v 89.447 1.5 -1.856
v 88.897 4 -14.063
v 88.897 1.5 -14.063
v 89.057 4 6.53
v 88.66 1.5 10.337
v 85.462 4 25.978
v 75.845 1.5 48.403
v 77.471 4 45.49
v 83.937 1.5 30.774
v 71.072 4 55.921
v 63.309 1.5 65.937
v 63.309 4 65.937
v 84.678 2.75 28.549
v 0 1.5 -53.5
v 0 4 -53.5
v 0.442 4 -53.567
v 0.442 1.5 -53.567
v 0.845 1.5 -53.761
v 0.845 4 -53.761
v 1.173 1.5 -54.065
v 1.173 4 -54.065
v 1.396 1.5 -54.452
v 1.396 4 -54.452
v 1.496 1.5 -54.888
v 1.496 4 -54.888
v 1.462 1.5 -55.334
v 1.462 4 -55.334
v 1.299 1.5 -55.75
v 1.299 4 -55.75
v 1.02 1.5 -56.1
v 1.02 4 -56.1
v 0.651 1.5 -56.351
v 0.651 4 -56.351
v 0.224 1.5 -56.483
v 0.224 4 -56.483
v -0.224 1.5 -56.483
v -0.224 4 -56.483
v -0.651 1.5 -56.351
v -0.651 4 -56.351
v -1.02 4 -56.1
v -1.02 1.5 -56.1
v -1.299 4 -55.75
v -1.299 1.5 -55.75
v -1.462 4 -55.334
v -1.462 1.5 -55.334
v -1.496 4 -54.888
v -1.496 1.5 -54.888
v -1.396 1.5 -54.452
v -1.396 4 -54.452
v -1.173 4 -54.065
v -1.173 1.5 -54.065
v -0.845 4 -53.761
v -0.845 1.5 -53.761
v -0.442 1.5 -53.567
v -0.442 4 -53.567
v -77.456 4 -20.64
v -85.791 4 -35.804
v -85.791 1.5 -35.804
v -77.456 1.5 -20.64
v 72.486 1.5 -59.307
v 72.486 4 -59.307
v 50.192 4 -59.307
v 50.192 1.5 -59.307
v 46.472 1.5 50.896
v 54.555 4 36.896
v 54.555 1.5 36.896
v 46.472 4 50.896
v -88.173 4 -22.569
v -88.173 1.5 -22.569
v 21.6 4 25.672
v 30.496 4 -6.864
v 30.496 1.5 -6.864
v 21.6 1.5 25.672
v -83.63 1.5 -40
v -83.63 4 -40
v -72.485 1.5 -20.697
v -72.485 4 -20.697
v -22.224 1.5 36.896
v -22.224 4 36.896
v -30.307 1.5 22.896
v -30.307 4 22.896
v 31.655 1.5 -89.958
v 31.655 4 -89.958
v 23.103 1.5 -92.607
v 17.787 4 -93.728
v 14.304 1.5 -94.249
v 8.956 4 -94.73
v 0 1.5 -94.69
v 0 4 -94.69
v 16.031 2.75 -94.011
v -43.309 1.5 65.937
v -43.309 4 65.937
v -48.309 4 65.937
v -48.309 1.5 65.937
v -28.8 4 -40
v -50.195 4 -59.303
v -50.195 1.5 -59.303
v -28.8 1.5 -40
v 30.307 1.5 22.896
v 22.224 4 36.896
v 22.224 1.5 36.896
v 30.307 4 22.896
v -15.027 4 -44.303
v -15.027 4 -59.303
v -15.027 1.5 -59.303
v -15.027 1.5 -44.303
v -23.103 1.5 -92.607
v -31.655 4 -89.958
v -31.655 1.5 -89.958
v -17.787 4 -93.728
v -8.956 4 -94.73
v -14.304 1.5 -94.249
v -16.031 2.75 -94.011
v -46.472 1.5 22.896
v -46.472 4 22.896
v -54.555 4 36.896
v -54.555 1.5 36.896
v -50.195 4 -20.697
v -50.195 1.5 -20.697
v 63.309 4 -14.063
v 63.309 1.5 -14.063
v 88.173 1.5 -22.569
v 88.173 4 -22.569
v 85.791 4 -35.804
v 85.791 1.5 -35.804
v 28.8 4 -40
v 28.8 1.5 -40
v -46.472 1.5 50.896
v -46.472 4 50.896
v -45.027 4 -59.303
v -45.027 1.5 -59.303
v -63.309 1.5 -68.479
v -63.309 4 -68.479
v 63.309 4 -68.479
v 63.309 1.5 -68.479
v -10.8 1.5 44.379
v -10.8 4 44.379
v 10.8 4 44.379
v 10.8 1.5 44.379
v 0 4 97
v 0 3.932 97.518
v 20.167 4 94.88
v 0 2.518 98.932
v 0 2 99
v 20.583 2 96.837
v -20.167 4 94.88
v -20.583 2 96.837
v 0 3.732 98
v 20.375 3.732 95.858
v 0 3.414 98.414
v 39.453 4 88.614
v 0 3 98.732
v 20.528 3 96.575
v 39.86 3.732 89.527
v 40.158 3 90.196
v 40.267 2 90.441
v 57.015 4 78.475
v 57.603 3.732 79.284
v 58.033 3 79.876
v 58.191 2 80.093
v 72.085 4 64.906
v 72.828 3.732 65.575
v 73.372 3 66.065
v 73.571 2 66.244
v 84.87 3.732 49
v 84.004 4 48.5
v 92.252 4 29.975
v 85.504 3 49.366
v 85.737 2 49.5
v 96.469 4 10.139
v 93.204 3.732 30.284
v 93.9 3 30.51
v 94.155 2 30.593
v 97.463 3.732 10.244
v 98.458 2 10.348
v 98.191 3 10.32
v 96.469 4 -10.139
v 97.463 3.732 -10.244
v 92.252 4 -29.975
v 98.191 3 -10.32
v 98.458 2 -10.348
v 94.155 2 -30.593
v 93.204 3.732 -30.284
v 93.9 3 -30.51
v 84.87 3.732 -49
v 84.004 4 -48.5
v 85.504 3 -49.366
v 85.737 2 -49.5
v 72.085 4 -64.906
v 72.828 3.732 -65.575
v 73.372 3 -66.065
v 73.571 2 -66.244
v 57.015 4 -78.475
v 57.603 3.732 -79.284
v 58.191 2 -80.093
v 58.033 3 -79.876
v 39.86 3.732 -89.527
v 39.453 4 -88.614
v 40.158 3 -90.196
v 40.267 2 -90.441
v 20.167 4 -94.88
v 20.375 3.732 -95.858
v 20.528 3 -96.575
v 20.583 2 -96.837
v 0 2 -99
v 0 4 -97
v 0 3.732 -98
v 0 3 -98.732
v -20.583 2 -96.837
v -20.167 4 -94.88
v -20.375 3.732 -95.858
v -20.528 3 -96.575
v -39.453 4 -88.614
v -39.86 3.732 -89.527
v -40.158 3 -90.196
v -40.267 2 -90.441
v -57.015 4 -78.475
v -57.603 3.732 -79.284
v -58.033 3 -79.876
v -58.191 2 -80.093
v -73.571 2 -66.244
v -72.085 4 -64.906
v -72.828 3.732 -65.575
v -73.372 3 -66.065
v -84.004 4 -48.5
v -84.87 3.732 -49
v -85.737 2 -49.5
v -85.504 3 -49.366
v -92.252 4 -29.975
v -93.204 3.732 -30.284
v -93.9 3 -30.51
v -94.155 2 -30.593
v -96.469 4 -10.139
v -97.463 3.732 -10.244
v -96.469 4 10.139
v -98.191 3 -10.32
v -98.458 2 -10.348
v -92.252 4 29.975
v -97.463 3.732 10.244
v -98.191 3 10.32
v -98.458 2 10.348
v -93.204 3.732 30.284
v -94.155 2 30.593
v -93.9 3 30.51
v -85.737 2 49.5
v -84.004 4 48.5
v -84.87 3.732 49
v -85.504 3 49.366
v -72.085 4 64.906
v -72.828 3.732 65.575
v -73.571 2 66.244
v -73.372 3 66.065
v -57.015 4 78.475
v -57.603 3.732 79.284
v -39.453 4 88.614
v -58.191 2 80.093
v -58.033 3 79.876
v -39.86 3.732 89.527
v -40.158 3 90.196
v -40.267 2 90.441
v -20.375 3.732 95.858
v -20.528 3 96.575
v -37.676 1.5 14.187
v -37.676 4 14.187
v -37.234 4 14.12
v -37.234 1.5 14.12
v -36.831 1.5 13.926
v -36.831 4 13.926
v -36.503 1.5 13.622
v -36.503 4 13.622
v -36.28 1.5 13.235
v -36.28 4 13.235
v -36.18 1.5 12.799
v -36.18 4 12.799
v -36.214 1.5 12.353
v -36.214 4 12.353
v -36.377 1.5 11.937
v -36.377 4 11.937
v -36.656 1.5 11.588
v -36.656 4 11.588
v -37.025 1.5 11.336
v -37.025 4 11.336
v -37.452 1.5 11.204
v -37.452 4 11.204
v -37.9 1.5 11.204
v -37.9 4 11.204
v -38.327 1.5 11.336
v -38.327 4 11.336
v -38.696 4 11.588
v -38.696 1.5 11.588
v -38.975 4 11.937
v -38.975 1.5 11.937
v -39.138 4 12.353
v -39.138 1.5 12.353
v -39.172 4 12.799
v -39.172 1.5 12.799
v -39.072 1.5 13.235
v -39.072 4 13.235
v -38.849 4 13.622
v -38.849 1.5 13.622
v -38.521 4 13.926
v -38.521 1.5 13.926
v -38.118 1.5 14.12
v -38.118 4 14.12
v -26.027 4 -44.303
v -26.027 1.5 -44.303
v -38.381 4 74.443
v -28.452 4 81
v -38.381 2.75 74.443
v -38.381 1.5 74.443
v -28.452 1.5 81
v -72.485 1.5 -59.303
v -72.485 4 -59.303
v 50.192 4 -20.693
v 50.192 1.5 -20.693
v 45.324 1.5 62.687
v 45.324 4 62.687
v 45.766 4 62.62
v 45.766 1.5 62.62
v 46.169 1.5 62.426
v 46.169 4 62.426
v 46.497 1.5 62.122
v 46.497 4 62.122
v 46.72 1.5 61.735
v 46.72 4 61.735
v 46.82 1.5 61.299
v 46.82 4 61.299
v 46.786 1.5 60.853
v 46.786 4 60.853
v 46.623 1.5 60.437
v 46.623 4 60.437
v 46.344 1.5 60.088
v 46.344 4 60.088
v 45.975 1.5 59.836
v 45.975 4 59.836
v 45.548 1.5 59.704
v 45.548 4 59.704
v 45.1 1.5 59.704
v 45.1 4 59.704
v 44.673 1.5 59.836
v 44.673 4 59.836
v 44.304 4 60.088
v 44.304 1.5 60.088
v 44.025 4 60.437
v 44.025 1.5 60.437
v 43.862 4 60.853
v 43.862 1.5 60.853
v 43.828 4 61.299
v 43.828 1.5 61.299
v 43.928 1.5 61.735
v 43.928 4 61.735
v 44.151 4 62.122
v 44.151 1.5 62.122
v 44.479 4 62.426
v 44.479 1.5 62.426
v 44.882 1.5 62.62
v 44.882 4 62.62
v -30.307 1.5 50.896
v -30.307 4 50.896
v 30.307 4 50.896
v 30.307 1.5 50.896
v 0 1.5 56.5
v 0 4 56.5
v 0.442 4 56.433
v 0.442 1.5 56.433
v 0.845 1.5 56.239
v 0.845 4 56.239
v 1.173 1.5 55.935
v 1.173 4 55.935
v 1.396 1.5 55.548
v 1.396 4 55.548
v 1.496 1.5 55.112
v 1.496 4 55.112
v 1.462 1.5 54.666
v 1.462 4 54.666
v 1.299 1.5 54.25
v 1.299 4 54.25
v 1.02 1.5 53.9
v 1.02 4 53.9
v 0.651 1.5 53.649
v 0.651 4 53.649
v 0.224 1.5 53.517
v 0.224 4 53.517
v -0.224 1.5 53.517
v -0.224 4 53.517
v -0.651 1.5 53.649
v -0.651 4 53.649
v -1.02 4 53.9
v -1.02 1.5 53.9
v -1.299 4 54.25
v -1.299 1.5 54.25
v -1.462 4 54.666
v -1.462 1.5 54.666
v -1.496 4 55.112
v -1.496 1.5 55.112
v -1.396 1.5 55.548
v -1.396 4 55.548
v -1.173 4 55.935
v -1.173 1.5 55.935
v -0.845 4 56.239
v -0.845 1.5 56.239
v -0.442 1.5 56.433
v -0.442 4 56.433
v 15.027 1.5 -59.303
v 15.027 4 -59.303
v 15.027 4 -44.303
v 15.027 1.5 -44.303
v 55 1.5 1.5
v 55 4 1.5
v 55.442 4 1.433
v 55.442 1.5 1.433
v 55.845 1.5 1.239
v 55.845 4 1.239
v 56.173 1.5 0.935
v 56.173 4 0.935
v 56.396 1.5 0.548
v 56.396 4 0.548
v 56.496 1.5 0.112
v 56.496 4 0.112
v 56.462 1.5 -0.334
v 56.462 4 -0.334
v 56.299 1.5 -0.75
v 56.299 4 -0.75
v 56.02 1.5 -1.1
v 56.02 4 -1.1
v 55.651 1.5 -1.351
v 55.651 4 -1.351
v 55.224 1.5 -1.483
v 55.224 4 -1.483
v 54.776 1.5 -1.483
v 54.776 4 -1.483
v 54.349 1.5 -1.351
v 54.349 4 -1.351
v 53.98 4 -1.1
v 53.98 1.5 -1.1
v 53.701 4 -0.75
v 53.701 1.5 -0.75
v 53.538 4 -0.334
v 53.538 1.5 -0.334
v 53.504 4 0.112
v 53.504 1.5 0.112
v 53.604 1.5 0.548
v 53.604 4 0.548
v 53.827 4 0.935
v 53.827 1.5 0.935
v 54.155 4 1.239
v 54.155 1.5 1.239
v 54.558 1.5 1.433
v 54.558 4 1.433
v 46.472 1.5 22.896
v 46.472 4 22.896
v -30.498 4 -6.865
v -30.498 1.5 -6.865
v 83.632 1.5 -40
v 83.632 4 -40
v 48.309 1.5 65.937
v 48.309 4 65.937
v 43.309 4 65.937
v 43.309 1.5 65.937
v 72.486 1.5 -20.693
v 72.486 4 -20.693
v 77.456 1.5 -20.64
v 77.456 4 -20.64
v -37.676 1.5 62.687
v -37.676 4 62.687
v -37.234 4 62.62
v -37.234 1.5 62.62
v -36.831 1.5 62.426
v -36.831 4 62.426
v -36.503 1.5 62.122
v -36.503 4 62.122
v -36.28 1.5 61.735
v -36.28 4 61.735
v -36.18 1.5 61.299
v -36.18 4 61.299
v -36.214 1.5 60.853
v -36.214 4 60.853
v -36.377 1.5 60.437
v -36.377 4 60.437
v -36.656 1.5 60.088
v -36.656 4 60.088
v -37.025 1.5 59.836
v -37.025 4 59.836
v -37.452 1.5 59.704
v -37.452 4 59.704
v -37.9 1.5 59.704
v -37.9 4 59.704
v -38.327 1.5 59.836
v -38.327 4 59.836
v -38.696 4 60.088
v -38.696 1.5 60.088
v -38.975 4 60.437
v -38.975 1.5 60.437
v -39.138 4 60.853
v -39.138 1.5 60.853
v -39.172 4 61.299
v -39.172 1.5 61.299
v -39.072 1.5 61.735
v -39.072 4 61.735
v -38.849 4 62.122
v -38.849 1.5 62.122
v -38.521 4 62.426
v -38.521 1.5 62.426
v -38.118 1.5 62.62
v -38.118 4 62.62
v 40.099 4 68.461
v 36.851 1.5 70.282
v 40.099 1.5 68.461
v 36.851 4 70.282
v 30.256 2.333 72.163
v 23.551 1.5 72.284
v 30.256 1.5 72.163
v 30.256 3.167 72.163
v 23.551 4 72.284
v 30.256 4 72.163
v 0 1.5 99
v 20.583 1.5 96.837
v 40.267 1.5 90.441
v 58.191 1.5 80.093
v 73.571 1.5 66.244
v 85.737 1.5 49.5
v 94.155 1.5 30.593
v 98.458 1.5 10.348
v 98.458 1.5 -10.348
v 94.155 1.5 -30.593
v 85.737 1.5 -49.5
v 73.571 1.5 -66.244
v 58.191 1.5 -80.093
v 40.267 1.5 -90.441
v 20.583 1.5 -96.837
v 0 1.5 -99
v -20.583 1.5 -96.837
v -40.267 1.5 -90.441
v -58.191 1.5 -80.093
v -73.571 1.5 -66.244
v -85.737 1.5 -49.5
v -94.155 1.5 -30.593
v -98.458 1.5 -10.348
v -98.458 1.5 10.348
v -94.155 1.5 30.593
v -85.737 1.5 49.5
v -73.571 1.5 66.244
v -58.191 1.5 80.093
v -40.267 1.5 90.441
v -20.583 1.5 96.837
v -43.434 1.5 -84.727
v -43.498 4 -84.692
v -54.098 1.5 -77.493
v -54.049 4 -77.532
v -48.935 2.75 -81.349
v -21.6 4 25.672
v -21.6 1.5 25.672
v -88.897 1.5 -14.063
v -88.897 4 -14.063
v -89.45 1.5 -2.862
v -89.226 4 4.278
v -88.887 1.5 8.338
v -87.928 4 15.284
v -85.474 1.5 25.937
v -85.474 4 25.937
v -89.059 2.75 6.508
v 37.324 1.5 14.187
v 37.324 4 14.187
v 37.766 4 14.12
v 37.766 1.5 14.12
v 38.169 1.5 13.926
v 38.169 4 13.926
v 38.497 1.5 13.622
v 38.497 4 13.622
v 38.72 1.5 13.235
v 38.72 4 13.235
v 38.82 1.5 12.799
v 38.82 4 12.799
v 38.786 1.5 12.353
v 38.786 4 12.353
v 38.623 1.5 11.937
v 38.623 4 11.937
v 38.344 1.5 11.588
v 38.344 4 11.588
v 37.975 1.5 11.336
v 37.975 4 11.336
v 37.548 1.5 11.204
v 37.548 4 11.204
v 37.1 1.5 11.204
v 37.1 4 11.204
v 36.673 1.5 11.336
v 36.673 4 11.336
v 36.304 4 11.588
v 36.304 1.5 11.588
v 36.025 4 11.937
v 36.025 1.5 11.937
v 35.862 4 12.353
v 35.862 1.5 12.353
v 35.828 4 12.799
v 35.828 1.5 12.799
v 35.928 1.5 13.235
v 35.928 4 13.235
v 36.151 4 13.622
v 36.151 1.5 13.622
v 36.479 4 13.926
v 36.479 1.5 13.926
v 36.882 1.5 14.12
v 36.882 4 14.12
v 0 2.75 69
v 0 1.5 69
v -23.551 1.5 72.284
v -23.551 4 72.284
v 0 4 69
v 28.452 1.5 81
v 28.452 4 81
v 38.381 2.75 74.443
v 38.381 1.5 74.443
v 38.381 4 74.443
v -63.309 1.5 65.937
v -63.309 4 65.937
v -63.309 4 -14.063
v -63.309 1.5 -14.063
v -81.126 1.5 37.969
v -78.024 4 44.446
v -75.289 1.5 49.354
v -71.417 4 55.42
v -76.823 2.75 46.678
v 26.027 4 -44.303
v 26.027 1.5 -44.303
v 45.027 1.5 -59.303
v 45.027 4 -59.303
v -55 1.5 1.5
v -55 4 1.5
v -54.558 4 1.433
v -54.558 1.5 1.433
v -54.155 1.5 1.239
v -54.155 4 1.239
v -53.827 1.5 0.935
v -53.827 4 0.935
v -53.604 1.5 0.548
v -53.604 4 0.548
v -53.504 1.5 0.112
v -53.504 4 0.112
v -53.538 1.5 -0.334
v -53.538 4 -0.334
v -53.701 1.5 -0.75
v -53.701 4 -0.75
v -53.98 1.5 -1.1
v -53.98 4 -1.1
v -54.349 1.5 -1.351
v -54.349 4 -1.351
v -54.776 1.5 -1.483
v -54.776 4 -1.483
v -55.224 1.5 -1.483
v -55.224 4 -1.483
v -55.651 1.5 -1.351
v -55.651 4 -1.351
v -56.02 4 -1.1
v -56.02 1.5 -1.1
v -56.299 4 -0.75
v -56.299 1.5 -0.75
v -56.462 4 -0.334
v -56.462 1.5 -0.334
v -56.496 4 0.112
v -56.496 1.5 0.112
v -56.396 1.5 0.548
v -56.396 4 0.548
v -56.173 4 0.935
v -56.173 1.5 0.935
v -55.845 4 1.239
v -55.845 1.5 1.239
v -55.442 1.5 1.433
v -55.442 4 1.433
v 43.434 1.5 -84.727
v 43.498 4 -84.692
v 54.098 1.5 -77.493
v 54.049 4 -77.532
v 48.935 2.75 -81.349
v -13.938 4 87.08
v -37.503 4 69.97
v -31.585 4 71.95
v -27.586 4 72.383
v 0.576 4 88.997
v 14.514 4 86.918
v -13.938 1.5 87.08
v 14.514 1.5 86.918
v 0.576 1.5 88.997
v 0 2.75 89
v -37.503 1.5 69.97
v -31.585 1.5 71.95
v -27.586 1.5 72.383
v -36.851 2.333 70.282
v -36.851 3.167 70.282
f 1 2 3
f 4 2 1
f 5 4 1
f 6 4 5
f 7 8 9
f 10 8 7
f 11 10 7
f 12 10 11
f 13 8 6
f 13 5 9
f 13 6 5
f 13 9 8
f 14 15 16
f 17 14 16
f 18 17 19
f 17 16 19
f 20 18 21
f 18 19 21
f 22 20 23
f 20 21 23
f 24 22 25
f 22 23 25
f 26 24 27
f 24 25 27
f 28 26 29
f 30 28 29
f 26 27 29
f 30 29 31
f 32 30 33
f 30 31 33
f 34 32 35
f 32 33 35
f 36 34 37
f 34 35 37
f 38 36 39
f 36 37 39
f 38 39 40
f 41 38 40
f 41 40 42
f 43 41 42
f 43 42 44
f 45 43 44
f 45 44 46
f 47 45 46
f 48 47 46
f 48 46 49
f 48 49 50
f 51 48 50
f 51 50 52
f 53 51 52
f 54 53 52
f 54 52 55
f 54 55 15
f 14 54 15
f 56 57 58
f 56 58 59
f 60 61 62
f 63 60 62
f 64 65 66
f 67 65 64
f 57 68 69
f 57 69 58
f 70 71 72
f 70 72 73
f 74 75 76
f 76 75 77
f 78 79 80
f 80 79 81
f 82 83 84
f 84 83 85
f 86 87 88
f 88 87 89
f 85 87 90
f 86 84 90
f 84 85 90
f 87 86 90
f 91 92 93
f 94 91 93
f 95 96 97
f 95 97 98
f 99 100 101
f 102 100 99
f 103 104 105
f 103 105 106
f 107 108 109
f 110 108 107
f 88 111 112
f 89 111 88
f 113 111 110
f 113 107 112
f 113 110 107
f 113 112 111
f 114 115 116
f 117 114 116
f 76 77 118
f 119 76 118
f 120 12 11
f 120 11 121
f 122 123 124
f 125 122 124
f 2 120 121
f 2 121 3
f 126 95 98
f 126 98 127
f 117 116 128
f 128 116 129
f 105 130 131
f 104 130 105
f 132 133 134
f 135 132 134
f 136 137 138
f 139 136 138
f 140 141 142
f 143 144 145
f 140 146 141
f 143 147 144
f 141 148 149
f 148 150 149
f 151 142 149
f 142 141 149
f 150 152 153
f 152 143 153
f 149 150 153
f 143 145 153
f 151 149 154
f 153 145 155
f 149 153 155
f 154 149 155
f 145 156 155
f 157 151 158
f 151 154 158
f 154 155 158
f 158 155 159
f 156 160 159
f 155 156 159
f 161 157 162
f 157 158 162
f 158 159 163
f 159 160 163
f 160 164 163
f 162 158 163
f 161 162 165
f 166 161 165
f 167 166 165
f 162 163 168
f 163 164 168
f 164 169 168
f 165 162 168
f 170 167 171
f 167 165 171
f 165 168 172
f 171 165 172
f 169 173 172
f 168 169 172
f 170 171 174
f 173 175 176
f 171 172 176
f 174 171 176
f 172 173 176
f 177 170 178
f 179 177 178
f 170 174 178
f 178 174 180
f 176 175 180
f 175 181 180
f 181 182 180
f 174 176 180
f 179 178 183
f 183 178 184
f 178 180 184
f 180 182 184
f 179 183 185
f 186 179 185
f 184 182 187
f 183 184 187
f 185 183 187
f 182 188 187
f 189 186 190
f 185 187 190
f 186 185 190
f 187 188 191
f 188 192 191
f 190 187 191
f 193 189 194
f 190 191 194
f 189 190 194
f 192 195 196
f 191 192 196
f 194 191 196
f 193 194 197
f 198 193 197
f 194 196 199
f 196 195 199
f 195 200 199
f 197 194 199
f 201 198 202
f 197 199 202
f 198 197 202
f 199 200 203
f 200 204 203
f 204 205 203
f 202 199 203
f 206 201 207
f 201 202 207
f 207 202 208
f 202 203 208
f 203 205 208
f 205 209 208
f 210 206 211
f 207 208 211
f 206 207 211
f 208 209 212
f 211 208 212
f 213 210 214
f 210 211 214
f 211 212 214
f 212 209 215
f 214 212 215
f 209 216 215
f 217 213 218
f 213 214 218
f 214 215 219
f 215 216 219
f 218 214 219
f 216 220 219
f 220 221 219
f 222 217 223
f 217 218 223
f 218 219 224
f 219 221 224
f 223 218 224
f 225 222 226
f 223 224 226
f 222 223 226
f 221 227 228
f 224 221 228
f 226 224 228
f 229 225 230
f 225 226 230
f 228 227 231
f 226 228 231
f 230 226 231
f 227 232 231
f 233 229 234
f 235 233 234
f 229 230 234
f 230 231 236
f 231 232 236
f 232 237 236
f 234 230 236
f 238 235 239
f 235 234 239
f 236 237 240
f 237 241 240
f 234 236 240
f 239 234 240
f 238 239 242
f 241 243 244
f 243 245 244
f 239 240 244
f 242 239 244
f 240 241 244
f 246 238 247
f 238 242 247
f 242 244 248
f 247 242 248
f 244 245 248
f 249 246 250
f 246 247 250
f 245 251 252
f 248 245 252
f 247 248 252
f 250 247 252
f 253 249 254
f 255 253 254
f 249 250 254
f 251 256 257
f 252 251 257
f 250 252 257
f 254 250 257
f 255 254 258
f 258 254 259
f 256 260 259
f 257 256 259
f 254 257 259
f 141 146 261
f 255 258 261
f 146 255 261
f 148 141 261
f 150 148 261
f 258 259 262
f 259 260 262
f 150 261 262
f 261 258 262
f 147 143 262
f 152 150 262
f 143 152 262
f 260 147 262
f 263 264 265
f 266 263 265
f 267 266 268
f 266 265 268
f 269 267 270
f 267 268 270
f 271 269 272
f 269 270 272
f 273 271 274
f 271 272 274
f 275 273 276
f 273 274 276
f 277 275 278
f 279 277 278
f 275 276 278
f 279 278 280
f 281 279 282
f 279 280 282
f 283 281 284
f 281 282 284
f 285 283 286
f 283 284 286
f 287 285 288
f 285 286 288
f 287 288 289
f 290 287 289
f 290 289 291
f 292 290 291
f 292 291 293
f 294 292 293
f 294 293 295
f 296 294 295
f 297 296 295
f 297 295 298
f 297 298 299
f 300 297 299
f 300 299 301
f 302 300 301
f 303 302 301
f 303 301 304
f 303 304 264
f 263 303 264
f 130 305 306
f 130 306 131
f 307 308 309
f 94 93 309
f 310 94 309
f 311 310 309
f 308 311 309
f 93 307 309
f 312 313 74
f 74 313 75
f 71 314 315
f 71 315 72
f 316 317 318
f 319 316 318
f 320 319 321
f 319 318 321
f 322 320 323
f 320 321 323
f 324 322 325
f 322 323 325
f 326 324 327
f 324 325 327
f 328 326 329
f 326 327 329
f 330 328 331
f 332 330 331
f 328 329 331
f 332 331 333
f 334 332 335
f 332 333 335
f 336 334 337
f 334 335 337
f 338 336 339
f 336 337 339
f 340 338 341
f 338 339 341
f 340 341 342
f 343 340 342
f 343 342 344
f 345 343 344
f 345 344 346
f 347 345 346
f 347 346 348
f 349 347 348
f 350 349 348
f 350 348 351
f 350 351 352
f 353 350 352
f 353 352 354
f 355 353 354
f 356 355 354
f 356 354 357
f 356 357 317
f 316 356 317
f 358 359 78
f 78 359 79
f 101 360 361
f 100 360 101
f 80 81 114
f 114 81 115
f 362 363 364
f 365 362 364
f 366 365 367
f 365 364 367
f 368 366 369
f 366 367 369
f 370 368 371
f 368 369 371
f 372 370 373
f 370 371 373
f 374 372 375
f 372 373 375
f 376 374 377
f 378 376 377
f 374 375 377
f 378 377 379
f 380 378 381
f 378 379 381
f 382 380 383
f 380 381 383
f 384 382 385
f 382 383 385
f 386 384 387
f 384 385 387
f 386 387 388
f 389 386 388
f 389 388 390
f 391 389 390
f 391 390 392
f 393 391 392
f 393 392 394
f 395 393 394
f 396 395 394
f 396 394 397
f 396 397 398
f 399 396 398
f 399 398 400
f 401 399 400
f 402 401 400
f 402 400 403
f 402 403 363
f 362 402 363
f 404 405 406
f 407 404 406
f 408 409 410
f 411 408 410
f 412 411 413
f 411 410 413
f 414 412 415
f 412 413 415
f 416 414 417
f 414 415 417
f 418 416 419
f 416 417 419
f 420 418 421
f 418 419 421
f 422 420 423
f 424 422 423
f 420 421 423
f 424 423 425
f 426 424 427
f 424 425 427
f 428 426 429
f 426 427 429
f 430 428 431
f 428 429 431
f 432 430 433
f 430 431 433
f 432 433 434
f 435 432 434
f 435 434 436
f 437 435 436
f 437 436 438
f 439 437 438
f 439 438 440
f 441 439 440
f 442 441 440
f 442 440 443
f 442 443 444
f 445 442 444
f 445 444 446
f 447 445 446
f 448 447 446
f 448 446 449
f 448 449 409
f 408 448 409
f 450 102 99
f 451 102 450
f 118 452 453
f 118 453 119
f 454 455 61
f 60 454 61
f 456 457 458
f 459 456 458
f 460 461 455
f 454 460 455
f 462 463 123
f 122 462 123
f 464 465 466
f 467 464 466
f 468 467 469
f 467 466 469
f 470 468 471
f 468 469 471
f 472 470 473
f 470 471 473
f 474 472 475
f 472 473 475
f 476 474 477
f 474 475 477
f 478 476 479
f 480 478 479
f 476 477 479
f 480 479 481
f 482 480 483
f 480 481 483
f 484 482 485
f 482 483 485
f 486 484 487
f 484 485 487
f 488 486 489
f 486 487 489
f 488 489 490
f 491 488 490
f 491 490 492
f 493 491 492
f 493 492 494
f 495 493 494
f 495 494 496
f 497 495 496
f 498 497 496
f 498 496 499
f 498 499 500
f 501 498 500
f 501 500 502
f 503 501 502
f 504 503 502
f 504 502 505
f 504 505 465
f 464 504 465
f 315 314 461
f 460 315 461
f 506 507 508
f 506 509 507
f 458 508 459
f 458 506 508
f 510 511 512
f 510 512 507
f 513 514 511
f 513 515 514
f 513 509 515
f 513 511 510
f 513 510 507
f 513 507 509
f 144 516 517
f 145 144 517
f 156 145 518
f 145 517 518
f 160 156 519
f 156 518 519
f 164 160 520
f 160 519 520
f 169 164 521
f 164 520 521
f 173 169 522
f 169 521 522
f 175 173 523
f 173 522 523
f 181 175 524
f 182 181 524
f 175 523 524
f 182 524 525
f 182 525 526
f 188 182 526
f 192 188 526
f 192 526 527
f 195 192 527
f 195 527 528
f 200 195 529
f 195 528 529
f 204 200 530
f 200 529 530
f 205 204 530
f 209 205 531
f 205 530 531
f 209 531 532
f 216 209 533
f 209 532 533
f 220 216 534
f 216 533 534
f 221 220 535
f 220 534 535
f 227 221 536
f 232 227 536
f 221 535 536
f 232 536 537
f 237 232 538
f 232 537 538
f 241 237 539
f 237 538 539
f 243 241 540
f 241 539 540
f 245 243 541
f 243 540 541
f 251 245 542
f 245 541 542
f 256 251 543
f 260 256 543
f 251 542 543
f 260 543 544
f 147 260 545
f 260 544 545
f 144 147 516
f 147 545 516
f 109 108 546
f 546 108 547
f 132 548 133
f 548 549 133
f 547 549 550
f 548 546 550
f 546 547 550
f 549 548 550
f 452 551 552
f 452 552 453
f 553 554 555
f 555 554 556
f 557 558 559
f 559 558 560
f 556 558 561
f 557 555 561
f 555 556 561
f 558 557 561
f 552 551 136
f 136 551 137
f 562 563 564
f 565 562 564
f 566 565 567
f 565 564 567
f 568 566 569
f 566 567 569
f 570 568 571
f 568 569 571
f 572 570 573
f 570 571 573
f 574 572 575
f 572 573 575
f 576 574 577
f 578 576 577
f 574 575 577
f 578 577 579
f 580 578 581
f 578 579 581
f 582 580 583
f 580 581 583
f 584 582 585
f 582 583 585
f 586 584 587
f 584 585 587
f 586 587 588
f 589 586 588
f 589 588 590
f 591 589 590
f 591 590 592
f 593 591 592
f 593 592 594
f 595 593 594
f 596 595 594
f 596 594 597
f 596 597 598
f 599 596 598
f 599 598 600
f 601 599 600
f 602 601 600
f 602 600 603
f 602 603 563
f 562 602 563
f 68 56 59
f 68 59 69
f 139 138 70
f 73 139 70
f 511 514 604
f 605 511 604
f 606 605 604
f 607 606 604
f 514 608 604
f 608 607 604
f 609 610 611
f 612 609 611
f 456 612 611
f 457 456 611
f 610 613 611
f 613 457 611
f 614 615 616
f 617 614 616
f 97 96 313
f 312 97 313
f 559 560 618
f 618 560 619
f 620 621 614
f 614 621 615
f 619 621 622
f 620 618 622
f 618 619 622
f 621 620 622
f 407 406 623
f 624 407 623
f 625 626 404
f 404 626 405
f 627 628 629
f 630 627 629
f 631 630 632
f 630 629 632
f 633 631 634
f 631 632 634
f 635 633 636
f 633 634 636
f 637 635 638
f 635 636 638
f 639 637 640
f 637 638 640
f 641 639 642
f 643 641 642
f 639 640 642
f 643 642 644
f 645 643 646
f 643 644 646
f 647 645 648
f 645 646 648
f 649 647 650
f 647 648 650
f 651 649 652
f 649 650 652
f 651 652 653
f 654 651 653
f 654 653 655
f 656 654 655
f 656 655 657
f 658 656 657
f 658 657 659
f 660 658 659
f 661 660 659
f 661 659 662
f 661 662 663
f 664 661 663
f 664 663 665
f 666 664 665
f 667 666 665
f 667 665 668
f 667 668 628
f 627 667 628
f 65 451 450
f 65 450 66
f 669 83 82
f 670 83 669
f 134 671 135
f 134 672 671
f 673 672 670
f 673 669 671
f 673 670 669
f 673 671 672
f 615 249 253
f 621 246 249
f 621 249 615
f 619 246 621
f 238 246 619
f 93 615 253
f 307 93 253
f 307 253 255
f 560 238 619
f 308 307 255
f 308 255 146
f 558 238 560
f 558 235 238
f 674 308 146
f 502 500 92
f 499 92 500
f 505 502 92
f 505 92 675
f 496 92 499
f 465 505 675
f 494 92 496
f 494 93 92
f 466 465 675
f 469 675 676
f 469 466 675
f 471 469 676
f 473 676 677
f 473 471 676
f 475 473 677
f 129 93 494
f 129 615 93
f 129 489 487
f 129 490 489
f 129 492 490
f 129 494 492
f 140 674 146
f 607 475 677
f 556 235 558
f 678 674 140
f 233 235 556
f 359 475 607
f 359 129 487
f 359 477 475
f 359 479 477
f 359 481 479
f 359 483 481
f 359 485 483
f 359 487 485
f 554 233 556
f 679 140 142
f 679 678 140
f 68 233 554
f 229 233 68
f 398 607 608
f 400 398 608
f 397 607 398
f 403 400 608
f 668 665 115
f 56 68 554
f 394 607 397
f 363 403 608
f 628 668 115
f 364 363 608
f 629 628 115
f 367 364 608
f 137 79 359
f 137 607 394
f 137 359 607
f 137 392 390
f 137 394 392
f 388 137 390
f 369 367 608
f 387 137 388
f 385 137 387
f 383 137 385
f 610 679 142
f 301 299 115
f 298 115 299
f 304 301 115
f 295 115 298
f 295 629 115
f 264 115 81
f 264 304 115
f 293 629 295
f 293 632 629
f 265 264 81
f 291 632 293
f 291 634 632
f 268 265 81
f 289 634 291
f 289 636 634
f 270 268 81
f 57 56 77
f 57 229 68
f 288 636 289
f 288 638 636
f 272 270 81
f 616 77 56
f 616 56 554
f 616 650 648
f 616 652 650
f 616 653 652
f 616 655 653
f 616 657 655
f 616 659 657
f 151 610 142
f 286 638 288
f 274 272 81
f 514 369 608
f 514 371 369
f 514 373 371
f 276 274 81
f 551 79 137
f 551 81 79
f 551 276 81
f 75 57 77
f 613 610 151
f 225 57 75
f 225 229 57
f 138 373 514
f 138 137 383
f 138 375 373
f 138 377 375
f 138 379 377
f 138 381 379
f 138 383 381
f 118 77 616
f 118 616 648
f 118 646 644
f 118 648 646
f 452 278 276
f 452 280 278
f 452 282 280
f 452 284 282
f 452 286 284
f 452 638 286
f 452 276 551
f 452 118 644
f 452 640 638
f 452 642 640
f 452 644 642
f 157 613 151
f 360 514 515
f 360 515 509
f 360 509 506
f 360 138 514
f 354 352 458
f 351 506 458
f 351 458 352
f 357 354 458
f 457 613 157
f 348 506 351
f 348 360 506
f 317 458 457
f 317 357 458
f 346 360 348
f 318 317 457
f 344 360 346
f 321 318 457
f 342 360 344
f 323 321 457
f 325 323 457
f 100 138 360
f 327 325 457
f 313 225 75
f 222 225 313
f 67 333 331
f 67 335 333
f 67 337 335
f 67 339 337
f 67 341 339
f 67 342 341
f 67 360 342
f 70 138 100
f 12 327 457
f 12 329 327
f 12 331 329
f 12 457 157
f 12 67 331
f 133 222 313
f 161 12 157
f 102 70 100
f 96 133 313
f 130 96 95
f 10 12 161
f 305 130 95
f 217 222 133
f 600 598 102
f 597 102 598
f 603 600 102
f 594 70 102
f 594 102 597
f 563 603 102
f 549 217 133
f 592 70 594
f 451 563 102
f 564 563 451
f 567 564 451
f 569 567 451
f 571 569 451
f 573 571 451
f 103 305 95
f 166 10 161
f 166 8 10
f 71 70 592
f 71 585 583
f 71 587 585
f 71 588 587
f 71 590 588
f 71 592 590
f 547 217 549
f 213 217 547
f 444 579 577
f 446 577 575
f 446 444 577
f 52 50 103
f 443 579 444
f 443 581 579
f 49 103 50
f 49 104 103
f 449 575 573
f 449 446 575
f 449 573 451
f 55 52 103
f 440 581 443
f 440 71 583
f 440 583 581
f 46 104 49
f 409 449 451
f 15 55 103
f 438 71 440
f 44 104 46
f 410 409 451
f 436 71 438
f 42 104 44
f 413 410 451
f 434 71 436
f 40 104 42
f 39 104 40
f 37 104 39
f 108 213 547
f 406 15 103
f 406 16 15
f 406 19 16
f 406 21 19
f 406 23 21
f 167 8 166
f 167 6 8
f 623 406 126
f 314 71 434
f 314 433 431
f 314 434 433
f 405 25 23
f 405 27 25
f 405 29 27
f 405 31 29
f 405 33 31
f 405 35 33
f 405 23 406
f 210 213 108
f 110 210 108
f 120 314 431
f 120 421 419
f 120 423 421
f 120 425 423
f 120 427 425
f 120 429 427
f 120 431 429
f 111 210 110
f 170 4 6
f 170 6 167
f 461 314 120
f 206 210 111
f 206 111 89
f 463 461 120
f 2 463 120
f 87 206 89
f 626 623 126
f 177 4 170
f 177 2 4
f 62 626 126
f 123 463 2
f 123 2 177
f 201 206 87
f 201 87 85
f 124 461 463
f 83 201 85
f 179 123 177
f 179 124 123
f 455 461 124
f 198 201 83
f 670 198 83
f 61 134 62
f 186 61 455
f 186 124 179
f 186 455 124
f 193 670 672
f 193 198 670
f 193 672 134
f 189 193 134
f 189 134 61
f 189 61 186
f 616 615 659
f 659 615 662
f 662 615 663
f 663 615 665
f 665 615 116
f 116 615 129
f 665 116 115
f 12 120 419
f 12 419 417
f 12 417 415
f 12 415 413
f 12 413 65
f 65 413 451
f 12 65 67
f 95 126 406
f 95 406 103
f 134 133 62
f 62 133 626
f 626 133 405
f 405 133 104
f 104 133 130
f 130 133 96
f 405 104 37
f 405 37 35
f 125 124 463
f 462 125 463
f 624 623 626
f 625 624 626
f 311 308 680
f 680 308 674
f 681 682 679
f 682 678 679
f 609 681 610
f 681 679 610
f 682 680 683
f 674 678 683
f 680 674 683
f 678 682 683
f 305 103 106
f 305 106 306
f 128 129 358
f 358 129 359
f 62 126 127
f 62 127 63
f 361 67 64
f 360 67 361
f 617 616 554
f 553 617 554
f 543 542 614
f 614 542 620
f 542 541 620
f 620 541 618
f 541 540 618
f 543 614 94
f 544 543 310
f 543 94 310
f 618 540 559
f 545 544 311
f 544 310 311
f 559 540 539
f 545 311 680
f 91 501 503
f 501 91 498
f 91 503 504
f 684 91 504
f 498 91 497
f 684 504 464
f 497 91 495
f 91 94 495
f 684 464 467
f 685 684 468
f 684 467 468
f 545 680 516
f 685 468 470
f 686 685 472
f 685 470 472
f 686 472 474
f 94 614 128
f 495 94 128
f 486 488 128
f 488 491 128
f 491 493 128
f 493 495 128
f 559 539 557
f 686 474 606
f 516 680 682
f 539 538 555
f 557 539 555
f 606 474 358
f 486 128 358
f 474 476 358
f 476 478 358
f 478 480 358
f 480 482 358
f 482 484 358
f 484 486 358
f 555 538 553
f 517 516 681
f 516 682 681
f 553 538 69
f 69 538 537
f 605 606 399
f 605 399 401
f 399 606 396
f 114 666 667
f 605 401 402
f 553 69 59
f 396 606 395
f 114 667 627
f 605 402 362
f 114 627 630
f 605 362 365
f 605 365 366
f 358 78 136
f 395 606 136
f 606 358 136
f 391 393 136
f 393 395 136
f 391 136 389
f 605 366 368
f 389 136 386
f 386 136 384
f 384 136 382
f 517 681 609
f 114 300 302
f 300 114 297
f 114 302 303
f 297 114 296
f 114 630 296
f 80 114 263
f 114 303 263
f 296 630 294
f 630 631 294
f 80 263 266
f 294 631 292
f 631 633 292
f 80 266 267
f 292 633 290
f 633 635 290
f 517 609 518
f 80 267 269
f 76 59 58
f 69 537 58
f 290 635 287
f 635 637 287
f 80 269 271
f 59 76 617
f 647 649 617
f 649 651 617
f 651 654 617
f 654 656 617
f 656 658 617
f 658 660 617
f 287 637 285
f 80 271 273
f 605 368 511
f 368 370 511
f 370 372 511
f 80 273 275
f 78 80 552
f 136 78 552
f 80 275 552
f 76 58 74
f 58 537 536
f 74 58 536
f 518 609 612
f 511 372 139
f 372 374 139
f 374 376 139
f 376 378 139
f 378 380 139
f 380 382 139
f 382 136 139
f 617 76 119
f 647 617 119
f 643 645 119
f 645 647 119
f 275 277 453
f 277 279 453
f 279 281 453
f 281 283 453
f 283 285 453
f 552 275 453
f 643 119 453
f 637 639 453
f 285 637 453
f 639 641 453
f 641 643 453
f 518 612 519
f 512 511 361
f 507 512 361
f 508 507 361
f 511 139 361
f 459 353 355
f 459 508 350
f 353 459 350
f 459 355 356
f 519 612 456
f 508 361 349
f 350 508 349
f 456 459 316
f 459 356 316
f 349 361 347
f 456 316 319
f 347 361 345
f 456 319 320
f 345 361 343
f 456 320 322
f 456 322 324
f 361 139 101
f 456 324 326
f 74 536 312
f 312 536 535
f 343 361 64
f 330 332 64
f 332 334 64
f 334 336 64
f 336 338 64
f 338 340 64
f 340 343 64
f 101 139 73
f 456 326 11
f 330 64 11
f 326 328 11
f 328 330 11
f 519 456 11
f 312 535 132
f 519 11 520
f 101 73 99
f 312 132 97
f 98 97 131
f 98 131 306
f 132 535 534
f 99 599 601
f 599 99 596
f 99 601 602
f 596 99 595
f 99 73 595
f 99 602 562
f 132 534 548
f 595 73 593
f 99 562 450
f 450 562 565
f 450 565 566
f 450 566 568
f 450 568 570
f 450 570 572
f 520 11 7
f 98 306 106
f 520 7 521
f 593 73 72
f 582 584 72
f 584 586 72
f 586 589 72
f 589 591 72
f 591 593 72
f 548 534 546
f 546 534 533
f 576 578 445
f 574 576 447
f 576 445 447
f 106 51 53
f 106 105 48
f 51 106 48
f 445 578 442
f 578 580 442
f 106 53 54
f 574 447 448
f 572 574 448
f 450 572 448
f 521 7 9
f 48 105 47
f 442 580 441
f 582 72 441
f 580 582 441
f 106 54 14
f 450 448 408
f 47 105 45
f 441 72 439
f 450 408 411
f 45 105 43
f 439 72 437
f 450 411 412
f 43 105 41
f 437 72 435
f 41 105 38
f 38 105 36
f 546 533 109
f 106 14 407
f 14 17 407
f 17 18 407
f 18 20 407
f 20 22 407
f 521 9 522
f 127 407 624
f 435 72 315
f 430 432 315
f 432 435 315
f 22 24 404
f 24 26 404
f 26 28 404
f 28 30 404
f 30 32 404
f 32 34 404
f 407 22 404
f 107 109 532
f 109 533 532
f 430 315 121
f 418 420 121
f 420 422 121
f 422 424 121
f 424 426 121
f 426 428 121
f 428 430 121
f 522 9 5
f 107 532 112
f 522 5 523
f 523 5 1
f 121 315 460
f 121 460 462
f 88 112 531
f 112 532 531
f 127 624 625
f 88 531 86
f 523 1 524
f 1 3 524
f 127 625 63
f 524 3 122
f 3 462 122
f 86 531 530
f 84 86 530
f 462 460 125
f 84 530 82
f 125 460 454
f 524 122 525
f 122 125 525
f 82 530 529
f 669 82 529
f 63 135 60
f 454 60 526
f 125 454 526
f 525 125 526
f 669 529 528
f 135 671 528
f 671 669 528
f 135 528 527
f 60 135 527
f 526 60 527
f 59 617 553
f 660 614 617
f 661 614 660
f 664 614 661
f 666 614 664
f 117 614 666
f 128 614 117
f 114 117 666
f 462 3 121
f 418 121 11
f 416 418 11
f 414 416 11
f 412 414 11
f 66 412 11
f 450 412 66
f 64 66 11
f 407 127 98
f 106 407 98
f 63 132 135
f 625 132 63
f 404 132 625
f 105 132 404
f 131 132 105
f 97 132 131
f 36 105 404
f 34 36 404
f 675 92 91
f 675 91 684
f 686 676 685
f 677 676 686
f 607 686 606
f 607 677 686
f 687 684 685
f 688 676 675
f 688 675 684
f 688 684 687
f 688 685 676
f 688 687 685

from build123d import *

# Parameters (mm, degrees)
BOSS_EXTRUDE1_DEPTH      = 4
BOSS_EXTRUDE1_DEPTH_BACK = 2.5
SKETCH1_R                = 99
SKETCH3_R                = 1.5
CUT_EXTRUDE2_DEPTH       = 20.5
SKETCH4_R                = 1.5
CUT_EXTRUDE3_DEPTH       = 20.5
CUT_EXTRUDE4_DEPTH       = 10
CUT_EXTRUDE5_DEPTH       = 10
CUT_EXTRUDE6_DEPTH       = 10
BOSS_EXTRUDE4_DEPTH      = 6.5
CUT_EXTRUDE12_DEPTH      = 147.5
CUT_EXTRUDE12_DEPTH_BACK = 90
SKETCH9_W                = 198
SKETCH9_H                = 4
SKETCH15_R               = 1.5
CUT_EXTRUDE13_DEPTH      = 147.5
BOSS_EXTRUDE12_DEPTH     = 2.5
CUT_EXTRUDE14_DEPTH      = 2.5
CUT_EXTRUDE15_DEPTH      = 2.5
BOSS_EXTRUDE14_DEPTH     = 2.5
CUT_EXTRUDE28_DEPTH      = 2.5
CUT_EXTRUDE30_DEPTH      = 2.5
CUT_EXTRUDE31_DEPTH      = 2.5
CUT_EXTRUDE32_DEPTH      = 2.5
CUT_EXTRUDE33_DEPTH      = 2.5
FILLET1_R                = 2


with BuildPart() as part:
    # Sketch1 → Boss-Extrude1 (new, two sides: drawn at the far end of the back side and taken through both)
    with BuildSketch(Plane(origin=(0, 0, 0), x_dir=(1, 0, 0), z_dir=(0, 1, 0)).offset(-BOSS_EXTRUDE1_DEPTH_BACK)):
        with Locations(Location((0, 0, 0), (0, 0, 270))):
            Circle(SKETCH1_R)
    extrude(amount=BOSS_EXTRUDE1_DEPTH + BOSS_EXTRUDE1_DEPTH_BACK)

    # Sketch3 → Cut-Extrude2 (cut)
    with BuildSketch(Plane(origin=(0, 4, 0), x_dir=(1, 0, 0), z_dir=(0, 1, 0))):
        with Locations(Location((-55, 0, 0), (0, 0, 270))):
            Circle(SKETCH3_R)
        with Locations(Location((55, 0, 0), (0, 0, 270))):
            Circle(SKETCH3_R)
        with Locations(Location((0, -55, 0), (0, 0, 270))):
            Circle(SKETCH3_R)
    extrude(amount=-CUT_EXTRUDE2_DEPTH, mode=Mode.SUBTRACT)

    # Sketch4 → Cut-Extrude3 (cut)
    with BuildSketch(Plane(origin=(0, 4, 0), x_dir=(1, 0, 0), z_dir=(0, 1, 0))):
        with Locations(Location((-37.67598398, -12.687109852, 0), (0, 0, 270))):
            Circle(SKETCH4_R)
        with Locations(Location((-37.67598398, -61.187109852, 0), (0, 0, 270))):
            Circle(SKETCH4_R)
        with Locations(Location((45.32401602, -61.187109852, 0), (0, 0, 270))):
            Circle(SKETCH4_R)
        with Locations(Location((37.32401602, -12.687109852, 0), (0, 0, 270))):
            Circle(SKETCH4_R)
    extrude(amount=-CUT_EXTRUDE3_DEPTH, mode=Mode.SUBTRACT)

    # Sketch5 → Cut-Extrude4 (cut)
    with BuildSketch(Plane(origin=(0, 4, 0), x_dir=(1, 0, 0), z_dir=(0, 1, 0))):
        Polygon((28.800278696, 40), (14.400139348, 64.941772986), (-14.400139348, 64.941772986), (-28.800278696, 40), (-14.400139348, 15.058227014), (14.400139348, 15.058227014), align=None)
        Polygon((21.600209022, -25.67229275), (10.800104511, -6.965963011), (-10.800104511, -6.965963011), (-21.600209022, -25.67229275), (-10.800104511, -44.37862249), (10.800104511, -44.37862249), align=None)
        Polygon((83.632371409, 40), (72.485714402, 59.306576271), (50.192400388, 59.306576271), (39.045743381, 40), (50.192400388, 20.693423729), (72.485714402, 20.693423729), align=None)
        Polygon((-39.050278696, 40), (-50.195139348, 59.303464893), (-72.484860652, 59.303464893), (-83.629721304, 40), (-72.484860652, 20.696535107), (-50.195139348, 20.696535107), align=None)
    extrude(amount=-CUT_EXTRUDE4_DEPTH, mode=Mode.SUBTRACT)

    # Sketch6 → Cut-Extrude5 (cut)
    with BuildSketch(Plane(origin=(0, 4, 0), x_dir=(1, 0, 0), z_dir=(0, 1, 0))):
        with BuildLine():
            add(Edge.make_bspline(
                [(-31.654711151, 89.957779093), (-50.388052391, 83.478791384), (-63.309422303, 68.478903242)],
                knots=[0, 0, 0, 1, 1, 1], degree=2))
            Line((-63.309422303, 68.478903242), (0, 68.478903242))
            Line((0, 68.478903242), (0, 89.957779093))
            Line((0, 89.957779093), (-31.654711151, 89.957779093))
        make_face()
        with BuildLine():
            Line((0, 89.957779093), (0, 68.478903242))
            Line((0, 68.478903242), (63.309422303, 68.478903242))
            add(Edge.make_bspline(
                [(31.654711151, 89.957779093), (50.388052391, 83.478791384), (63.309422303, 68.478903242)],
                knots=[0, 0, 0, 1, 1, 1], degree=2))
            Line((31.654711151, 89.957779093), (0, 89.957779093))
        make_face()
        with BuildLine():
            add(Edge.make_bspline(
                [(-31.654711151, 89.957779093), (-16.234373416, 95.698858628), (0, 94.690381395)],
                knots=[0, 0, 0, 1, 1, 1], degree=2))
            Line((-31.654711151, 89.957779093), (0, 89.957779093))
            Line((0, 89.957779093), (0, 94.690381395))
        make_face()
        with BuildLine():
            Line((0, 94.690381395), (0, 89.957779093))
            Line((0, 89.957779093), (31.654711151, 89.957779093))
            add(Edge.make_bspline(
                [(31.654711151, 89.957779093), (16.234373416, 95.698858628), (0, 94.690381395)],
                knots=[0, 0, 0, 1, 1, 1], degree=2))
        make_face()
    extrude(amount=-CUT_EXTRUDE5_DEPTH, mode=Mode.SUBTRACT)

    # Sketch7 → Cut-Extrude6 (cut)
    with BuildSketch(Plane(origin=(0, 4, 0), x_dir=(1, 0, 0), z_dir=(0, 1, 0))):
        with BuildLine():
            Line((-75.473576138, -25.936867131), (-63.309422303, -25.936867131))
            Line((-63.309422303, -25.936867131), (-63.309422303, 14.063132869))
            Line((-63.309422303, 14.063132869), (-88.897300533, 14.063132869))
            add(Edge.make_bspline(
                [(-88.897300533, 14.063132869), (-90.933307094, -7.078529926), (-85.473576138, -25.936867131)],
                knots=[0, 0, 0, 0.467488594, 0.467488594, 0.467488594], degree=2))
            Line((-85.473576138, -25.936867131), (-75.473576138, -25.936867131))
        make_face()
        with BuildLine():
            add(Edge.make_bspline(
                [(-85.473576138, -25.936867131), (-79.254453264, -47.418203342), (-63.309422303, -65.936867131)],
                knots=[0.467488594, 0.467488594, 0.467488594, 1, 1, 1], degree=2))
            Line((-63.309422303, -65.936867131), (-63.309422303, -25.936867131))
            Line((-63.309422303, -25.936867131), (-75.473576138, -25.936867131))
            Line((-75.473576138, -25.936867131), (-85.473576138, -25.936867131))
        make_face()
        with BuildLine():
            add(Edge.make_bspline(
                [(88.897300533, 14.063132869), (93.252501041, -31.160778622), (63.309422303, -65.936867131)],
                knots=[0, 0, 0, 1, 1, 1], degree=2))
            Line((63.309422303, -65.936867131), (63.309422303, 14.063132869))
            Line((63.309422303, 14.063132869), (88.897300533, 14.063132869))
        make_face()
    extrude(amount=-CUT_EXTRUDE6_DEPTH, mode=Mode.SUBTRACT)

    # Sketch8 → Boss-Extrude4 (add)
    with BuildSketch(Plane(origin=(0, 4, 0), x_dir=(1, 0, 0), z_dir=(0, 1, 0))):
        Polygon((14.400139348, 64.941772986), (-14.400139348, 64.941772986), (-28.800278696, 40), (0, 40), (28.800278696, 40), align=None)
    extrude(amount=-BOSS_EXTRUDE4_DEPTH)

    # Sketch9 → Cut-Extrude12 (cut, two sides: drawn at the far end of the back side and taken through both)
    with BuildSketch(Plane.XY.offset(-14.063132869).offset(-CUT_EXTRUDE12_DEPTH_BACK)):
        with Locations((0, -0.5)):
            Rectangle(SKETCH9_W, SKETCH9_H)
    extrude(amount=CUT_EXTRUDE12_DEPTH + CUT_EXTRUDE12_DEPTH_BACK, mode=Mode.SUBTRACT)

    # Sketch15 → Cut-Extrude13 (cut)
    with BuildSketch(Plane(origin=(0, 4, 0), x_dir=(1, 0, 0), z_dir=(0, 1, 0))):
        with Locations(Location((0, 55, 0), (0, 0, 270))):
            Circle(SKETCH15_R)
    extrude(amount=-CUT_EXTRUDE13_DEPTH, mode=Mode.SUBTRACT)

    # Sketch16 → Boss-Extrude12 (add)
    with BuildSketch(Plane(origin=(0, 4, 0), x_dir=(1, 0, 0), z_dir=(0, 1, 0))):
        Polygon((-43.18, 47.15288712), (-43.18, 32.84711288), (-39.050278696, 40), align=None)
        Polygon((43.18, 47.160742516), (43.18, 32.839257484), (50.192400388, 20.693423729), (50.192400388, 59.306576271), align=None)
        Polygon((39.045743381, 40), (43.18, 32.839257484), (43.18, 47.160742516), align=None)
        Polygon((-50.195139348, 59.303464893), (-50.195139348, 20.696535107), (-39.050278696, 40), align=None)
    extrude(amount=-BOSS_EXTRUDE12_DEPTH)

    # Sketch17 → Cut-Extrude14 (cut)
    with BuildSketch(Plane(origin=(0, 4, 0), x_dir=(1, 0, 0), z_dir=(0, 1, 0))):
        Polygon((-46.472442717, -50.896241942), (-30.30663518, -50.896241942), (-22.223731411, -36.896241942), (-30.30663518, -22.896241942), (-46.472442717, -22.896241942), (-54.555346486, -36.896241942), align=None)
        Polygon((22.223731411, -36.896241942), (30.30663518, -22.896241942), (46.472442717, -22.896241942), (54.555346486, -36.896241942), (46.472442717, -50.896241942), (30.30663518, -50.896241942), align=None)
    extrude(amount=-CUT_EXTRUDE14_DEPTH, mode=Mode.SUBTRACT)

    # Sketch18 → Cut-Extrude15 (cut)
    with BuildSketch(Plane(origin=(0, 4, 0), x_dir=(1, 0, 0), z_dir=(0, 1, 0))):
        with BuildLine():
            Line((-23.550738761, -72.283664778), (-28.452320168, -81))
            add(Edge.make_bspline(
                [(-28.452320168, -81), (-14.226160084, -89), (0, -89)],
                knots=[0.205519971, 0.205519971, 0.205519971, 0.5, 0.5, 0.5], degree=2))
            Line((0, -89), (0, -69))
            add(Edge.make_bspline(
                [(-23.550738761, -72.283664778), (-15.813437997, -71.682250906), (-7.906718999, -69), (0, -69)],
                knots=[0.233014595, 0.233014595, 0.233014595, 0.233014595, 0.5, 0.5, 0.5, 0.5], degree=3))
        make_face()
        with BuildLine():
            Line((-43.309422303, -65.936867131), (-48.309422303, -65.936867131))
            add(Edge.make_bspline(
                [(-48.309422303, -65.936867131), (-38.380871236, -75.416735924), (-28.452320168, -81)],
                knots=[0, 0, 0, 0.205519971, 0.205519971, 0.205519971], degree=2))
            Line((-28.452320168, -81), (-23.550738761, -72.283664778))
            add(Edge.make_bspline(
                [(-43.309422303, -65.936867131), (-36.927327916, -71.748446546), (-30.30355735, -72.80855568), (-23.550738761, -72.283664778)],
                knots=[0, 0, 0, 0, 0.233014595, 0.233014595, 0.233014595, 0.233014595], degree=3))
        make_face()
        with BuildLine():
            Line((0, -69), (0, -89))
            add(Edge.make_bspline(
                [(0, -89), (14.226160084, -89), (28.452320168, -81)],
                knots=[0.5, 0.5, 0.5, 0.794480029, 0.794480029, 0.794480029], degree=2))
            Line((28.452320168, -81), (23.550738761, -72.283664778))
            add(Edge.make_bspline(
                [(0, -69), (7.906718999, -69), (15.813437997, -71.682250906), (23.550738761, -72.283664778)],
                knots=[0.5, 0.5, 0.5, 0.5, 0.766985405, 0.766985405, 0.766985405, 0.766985405], degree=3))
        make_face()
        with BuildLine():
            Line((23.550738761, -72.283664778), (28.452320168, -81))
            add(Edge.make_bspline(
                [(28.452320168, -81), (38.380871236, -75.416735924), (48.309422303, -65.936867131)],
                knots=[0.794480029, 0.794480029, 0.794480029, 1, 1, 1], degree=2))
            Line((48.309422303, -65.936867131), (43.309422303, -65.936867131))
            add(Edge.make_bspline(
                [(23.550738761, -72.283664778), (30.30355735, -72.80855568), (36.927327916, -71.748446546), (43.309422303, -65.936867131)],
                knots=[0.766985405, 0.766985405, 0.766985405, 0.766985405, 1, 1, 1, 1], degree=3))
        make_face()
    extrude(amount=-CUT_EXTRUDE15_DEPTH, mode=Mode.SUBTRACT)

    # Sketch19 → Boss-Extrude14 (add)
    with BuildSketch(Plane(origin=(0, 4, 0), x_dir=(1, 0, 0), z_dir=(0, 1, 0))):
        Polygon((-10.800104511, -6.965963011), (-30.30663518, -22.896241942), (-14.400139348, 15.058227014), (14.400139348, 15.058227014), (30.30663518, -22.896241942), (10.800104511, -6.965963011), align=None)
    extrude(amount=-BOSS_EXTRUDE14_DEPTH)

    # Sketch20 → Cut-Extrude28 (cut)
    with BuildSketch(Plane(origin=(0, 4, 0), x_dir=(1, 0, 0), z_dir=(0, 1, 0))):
        Polygon((-28.800278696, 40), (-10.800104511, -6.965963011), (10.800104511, -6.965963011), (28.800278696, 40), (14.400139348, 15.058227014), (-14.400139348, 15.058227014), align=None)
    extrude(amount=-CUT_EXTRUDE28_DEPTH, mode=Mode.SUBTRACT)

    # Sketch24 → Cut-Extrude30 (cut)
    with BuildSketch(Plane(origin=(0, 4, 0), x_dir=(1, 0, 0), z_dir=(0, 1, 0))):
        Polygon((-50.195139348, 20.696535107), (-50.195139348, 59.303464893), (-28.800278696, 40), (-10.800104511, -6.965963011), align=None)
        Polygon((10.800104511, -6.965963011), (28.800278696, 40), (50.192400388, 59.306576271), (50.192400388, 20.693423729), align=None)
    extrude(amount=-CUT_EXTRUDE30_DEPTH, mode=Mode.SUBTRACT)

    # Sketch25 → Cut-Extrude31 (cut)
    with BuildSketch(Plane(origin=(0, 4, 0), x_dir=(1, 0, 0), z_dir=(0, 1, 0))):
        Polygon((-26.02741996, 44.303464893), (-45.02741996, 59.303464893), (-15.02741996, 59.303464893), (-15.02741996, 44.303464893), align=None)
        Polygon((15.02741996, 44.303464893), (26.02741996, 44.303464893), (45.02741996, 59.303464893), (15.02741996, 59.303464893), align=None)
    extrude(amount=-CUT_EXTRUDE31_DEPTH, mode=Mode.SUBTRACT)

    # Sketch26 → Cut-Extrude32 (cut)
    with BuildSketch(Plane(origin=(0, 4, 0), x_dir=(1, 0, 0), z_dir=(0, 1, 0))):
        Polygon((-21.600209022, -25.67229275), (-30.497621929, 6.865286048), (30.496252449, 6.863730359), (21.600209022, -25.67229275), align=None)
    extrude(amount=-CUT_EXTRUDE32_DEPTH, mode=Mode.SUBTRACT)

    # Sketch27 → Cut-Extrude33 (cut)
    with BuildSketch(Plane(origin=(0, 4, 0), x_dir=(1, 0, 0), z_dir=(0, 1, 0))):
        Polygon((-88.173481573, 22.569049832), (-85.791103644, 35.80448277), (-77.455908988, 20.639886767), align=None)
        Polygon((85.791103644, 35.80448277), (77.455908988, 20.639886767), (88.173481573, 22.569049832), align=None)
    extrude(amount=-CUT_EXTRUDE33_DEPTH, mode=Mode.SUBTRACT)

    # Fillet1
    fillet1_edges = [part.edges().sort_by_distance(p)[0] for p in [
        (0, 4, -99),
    ]]
    fillet(fillet1_edges, radius=FILLET1_R)


solid = part.part
